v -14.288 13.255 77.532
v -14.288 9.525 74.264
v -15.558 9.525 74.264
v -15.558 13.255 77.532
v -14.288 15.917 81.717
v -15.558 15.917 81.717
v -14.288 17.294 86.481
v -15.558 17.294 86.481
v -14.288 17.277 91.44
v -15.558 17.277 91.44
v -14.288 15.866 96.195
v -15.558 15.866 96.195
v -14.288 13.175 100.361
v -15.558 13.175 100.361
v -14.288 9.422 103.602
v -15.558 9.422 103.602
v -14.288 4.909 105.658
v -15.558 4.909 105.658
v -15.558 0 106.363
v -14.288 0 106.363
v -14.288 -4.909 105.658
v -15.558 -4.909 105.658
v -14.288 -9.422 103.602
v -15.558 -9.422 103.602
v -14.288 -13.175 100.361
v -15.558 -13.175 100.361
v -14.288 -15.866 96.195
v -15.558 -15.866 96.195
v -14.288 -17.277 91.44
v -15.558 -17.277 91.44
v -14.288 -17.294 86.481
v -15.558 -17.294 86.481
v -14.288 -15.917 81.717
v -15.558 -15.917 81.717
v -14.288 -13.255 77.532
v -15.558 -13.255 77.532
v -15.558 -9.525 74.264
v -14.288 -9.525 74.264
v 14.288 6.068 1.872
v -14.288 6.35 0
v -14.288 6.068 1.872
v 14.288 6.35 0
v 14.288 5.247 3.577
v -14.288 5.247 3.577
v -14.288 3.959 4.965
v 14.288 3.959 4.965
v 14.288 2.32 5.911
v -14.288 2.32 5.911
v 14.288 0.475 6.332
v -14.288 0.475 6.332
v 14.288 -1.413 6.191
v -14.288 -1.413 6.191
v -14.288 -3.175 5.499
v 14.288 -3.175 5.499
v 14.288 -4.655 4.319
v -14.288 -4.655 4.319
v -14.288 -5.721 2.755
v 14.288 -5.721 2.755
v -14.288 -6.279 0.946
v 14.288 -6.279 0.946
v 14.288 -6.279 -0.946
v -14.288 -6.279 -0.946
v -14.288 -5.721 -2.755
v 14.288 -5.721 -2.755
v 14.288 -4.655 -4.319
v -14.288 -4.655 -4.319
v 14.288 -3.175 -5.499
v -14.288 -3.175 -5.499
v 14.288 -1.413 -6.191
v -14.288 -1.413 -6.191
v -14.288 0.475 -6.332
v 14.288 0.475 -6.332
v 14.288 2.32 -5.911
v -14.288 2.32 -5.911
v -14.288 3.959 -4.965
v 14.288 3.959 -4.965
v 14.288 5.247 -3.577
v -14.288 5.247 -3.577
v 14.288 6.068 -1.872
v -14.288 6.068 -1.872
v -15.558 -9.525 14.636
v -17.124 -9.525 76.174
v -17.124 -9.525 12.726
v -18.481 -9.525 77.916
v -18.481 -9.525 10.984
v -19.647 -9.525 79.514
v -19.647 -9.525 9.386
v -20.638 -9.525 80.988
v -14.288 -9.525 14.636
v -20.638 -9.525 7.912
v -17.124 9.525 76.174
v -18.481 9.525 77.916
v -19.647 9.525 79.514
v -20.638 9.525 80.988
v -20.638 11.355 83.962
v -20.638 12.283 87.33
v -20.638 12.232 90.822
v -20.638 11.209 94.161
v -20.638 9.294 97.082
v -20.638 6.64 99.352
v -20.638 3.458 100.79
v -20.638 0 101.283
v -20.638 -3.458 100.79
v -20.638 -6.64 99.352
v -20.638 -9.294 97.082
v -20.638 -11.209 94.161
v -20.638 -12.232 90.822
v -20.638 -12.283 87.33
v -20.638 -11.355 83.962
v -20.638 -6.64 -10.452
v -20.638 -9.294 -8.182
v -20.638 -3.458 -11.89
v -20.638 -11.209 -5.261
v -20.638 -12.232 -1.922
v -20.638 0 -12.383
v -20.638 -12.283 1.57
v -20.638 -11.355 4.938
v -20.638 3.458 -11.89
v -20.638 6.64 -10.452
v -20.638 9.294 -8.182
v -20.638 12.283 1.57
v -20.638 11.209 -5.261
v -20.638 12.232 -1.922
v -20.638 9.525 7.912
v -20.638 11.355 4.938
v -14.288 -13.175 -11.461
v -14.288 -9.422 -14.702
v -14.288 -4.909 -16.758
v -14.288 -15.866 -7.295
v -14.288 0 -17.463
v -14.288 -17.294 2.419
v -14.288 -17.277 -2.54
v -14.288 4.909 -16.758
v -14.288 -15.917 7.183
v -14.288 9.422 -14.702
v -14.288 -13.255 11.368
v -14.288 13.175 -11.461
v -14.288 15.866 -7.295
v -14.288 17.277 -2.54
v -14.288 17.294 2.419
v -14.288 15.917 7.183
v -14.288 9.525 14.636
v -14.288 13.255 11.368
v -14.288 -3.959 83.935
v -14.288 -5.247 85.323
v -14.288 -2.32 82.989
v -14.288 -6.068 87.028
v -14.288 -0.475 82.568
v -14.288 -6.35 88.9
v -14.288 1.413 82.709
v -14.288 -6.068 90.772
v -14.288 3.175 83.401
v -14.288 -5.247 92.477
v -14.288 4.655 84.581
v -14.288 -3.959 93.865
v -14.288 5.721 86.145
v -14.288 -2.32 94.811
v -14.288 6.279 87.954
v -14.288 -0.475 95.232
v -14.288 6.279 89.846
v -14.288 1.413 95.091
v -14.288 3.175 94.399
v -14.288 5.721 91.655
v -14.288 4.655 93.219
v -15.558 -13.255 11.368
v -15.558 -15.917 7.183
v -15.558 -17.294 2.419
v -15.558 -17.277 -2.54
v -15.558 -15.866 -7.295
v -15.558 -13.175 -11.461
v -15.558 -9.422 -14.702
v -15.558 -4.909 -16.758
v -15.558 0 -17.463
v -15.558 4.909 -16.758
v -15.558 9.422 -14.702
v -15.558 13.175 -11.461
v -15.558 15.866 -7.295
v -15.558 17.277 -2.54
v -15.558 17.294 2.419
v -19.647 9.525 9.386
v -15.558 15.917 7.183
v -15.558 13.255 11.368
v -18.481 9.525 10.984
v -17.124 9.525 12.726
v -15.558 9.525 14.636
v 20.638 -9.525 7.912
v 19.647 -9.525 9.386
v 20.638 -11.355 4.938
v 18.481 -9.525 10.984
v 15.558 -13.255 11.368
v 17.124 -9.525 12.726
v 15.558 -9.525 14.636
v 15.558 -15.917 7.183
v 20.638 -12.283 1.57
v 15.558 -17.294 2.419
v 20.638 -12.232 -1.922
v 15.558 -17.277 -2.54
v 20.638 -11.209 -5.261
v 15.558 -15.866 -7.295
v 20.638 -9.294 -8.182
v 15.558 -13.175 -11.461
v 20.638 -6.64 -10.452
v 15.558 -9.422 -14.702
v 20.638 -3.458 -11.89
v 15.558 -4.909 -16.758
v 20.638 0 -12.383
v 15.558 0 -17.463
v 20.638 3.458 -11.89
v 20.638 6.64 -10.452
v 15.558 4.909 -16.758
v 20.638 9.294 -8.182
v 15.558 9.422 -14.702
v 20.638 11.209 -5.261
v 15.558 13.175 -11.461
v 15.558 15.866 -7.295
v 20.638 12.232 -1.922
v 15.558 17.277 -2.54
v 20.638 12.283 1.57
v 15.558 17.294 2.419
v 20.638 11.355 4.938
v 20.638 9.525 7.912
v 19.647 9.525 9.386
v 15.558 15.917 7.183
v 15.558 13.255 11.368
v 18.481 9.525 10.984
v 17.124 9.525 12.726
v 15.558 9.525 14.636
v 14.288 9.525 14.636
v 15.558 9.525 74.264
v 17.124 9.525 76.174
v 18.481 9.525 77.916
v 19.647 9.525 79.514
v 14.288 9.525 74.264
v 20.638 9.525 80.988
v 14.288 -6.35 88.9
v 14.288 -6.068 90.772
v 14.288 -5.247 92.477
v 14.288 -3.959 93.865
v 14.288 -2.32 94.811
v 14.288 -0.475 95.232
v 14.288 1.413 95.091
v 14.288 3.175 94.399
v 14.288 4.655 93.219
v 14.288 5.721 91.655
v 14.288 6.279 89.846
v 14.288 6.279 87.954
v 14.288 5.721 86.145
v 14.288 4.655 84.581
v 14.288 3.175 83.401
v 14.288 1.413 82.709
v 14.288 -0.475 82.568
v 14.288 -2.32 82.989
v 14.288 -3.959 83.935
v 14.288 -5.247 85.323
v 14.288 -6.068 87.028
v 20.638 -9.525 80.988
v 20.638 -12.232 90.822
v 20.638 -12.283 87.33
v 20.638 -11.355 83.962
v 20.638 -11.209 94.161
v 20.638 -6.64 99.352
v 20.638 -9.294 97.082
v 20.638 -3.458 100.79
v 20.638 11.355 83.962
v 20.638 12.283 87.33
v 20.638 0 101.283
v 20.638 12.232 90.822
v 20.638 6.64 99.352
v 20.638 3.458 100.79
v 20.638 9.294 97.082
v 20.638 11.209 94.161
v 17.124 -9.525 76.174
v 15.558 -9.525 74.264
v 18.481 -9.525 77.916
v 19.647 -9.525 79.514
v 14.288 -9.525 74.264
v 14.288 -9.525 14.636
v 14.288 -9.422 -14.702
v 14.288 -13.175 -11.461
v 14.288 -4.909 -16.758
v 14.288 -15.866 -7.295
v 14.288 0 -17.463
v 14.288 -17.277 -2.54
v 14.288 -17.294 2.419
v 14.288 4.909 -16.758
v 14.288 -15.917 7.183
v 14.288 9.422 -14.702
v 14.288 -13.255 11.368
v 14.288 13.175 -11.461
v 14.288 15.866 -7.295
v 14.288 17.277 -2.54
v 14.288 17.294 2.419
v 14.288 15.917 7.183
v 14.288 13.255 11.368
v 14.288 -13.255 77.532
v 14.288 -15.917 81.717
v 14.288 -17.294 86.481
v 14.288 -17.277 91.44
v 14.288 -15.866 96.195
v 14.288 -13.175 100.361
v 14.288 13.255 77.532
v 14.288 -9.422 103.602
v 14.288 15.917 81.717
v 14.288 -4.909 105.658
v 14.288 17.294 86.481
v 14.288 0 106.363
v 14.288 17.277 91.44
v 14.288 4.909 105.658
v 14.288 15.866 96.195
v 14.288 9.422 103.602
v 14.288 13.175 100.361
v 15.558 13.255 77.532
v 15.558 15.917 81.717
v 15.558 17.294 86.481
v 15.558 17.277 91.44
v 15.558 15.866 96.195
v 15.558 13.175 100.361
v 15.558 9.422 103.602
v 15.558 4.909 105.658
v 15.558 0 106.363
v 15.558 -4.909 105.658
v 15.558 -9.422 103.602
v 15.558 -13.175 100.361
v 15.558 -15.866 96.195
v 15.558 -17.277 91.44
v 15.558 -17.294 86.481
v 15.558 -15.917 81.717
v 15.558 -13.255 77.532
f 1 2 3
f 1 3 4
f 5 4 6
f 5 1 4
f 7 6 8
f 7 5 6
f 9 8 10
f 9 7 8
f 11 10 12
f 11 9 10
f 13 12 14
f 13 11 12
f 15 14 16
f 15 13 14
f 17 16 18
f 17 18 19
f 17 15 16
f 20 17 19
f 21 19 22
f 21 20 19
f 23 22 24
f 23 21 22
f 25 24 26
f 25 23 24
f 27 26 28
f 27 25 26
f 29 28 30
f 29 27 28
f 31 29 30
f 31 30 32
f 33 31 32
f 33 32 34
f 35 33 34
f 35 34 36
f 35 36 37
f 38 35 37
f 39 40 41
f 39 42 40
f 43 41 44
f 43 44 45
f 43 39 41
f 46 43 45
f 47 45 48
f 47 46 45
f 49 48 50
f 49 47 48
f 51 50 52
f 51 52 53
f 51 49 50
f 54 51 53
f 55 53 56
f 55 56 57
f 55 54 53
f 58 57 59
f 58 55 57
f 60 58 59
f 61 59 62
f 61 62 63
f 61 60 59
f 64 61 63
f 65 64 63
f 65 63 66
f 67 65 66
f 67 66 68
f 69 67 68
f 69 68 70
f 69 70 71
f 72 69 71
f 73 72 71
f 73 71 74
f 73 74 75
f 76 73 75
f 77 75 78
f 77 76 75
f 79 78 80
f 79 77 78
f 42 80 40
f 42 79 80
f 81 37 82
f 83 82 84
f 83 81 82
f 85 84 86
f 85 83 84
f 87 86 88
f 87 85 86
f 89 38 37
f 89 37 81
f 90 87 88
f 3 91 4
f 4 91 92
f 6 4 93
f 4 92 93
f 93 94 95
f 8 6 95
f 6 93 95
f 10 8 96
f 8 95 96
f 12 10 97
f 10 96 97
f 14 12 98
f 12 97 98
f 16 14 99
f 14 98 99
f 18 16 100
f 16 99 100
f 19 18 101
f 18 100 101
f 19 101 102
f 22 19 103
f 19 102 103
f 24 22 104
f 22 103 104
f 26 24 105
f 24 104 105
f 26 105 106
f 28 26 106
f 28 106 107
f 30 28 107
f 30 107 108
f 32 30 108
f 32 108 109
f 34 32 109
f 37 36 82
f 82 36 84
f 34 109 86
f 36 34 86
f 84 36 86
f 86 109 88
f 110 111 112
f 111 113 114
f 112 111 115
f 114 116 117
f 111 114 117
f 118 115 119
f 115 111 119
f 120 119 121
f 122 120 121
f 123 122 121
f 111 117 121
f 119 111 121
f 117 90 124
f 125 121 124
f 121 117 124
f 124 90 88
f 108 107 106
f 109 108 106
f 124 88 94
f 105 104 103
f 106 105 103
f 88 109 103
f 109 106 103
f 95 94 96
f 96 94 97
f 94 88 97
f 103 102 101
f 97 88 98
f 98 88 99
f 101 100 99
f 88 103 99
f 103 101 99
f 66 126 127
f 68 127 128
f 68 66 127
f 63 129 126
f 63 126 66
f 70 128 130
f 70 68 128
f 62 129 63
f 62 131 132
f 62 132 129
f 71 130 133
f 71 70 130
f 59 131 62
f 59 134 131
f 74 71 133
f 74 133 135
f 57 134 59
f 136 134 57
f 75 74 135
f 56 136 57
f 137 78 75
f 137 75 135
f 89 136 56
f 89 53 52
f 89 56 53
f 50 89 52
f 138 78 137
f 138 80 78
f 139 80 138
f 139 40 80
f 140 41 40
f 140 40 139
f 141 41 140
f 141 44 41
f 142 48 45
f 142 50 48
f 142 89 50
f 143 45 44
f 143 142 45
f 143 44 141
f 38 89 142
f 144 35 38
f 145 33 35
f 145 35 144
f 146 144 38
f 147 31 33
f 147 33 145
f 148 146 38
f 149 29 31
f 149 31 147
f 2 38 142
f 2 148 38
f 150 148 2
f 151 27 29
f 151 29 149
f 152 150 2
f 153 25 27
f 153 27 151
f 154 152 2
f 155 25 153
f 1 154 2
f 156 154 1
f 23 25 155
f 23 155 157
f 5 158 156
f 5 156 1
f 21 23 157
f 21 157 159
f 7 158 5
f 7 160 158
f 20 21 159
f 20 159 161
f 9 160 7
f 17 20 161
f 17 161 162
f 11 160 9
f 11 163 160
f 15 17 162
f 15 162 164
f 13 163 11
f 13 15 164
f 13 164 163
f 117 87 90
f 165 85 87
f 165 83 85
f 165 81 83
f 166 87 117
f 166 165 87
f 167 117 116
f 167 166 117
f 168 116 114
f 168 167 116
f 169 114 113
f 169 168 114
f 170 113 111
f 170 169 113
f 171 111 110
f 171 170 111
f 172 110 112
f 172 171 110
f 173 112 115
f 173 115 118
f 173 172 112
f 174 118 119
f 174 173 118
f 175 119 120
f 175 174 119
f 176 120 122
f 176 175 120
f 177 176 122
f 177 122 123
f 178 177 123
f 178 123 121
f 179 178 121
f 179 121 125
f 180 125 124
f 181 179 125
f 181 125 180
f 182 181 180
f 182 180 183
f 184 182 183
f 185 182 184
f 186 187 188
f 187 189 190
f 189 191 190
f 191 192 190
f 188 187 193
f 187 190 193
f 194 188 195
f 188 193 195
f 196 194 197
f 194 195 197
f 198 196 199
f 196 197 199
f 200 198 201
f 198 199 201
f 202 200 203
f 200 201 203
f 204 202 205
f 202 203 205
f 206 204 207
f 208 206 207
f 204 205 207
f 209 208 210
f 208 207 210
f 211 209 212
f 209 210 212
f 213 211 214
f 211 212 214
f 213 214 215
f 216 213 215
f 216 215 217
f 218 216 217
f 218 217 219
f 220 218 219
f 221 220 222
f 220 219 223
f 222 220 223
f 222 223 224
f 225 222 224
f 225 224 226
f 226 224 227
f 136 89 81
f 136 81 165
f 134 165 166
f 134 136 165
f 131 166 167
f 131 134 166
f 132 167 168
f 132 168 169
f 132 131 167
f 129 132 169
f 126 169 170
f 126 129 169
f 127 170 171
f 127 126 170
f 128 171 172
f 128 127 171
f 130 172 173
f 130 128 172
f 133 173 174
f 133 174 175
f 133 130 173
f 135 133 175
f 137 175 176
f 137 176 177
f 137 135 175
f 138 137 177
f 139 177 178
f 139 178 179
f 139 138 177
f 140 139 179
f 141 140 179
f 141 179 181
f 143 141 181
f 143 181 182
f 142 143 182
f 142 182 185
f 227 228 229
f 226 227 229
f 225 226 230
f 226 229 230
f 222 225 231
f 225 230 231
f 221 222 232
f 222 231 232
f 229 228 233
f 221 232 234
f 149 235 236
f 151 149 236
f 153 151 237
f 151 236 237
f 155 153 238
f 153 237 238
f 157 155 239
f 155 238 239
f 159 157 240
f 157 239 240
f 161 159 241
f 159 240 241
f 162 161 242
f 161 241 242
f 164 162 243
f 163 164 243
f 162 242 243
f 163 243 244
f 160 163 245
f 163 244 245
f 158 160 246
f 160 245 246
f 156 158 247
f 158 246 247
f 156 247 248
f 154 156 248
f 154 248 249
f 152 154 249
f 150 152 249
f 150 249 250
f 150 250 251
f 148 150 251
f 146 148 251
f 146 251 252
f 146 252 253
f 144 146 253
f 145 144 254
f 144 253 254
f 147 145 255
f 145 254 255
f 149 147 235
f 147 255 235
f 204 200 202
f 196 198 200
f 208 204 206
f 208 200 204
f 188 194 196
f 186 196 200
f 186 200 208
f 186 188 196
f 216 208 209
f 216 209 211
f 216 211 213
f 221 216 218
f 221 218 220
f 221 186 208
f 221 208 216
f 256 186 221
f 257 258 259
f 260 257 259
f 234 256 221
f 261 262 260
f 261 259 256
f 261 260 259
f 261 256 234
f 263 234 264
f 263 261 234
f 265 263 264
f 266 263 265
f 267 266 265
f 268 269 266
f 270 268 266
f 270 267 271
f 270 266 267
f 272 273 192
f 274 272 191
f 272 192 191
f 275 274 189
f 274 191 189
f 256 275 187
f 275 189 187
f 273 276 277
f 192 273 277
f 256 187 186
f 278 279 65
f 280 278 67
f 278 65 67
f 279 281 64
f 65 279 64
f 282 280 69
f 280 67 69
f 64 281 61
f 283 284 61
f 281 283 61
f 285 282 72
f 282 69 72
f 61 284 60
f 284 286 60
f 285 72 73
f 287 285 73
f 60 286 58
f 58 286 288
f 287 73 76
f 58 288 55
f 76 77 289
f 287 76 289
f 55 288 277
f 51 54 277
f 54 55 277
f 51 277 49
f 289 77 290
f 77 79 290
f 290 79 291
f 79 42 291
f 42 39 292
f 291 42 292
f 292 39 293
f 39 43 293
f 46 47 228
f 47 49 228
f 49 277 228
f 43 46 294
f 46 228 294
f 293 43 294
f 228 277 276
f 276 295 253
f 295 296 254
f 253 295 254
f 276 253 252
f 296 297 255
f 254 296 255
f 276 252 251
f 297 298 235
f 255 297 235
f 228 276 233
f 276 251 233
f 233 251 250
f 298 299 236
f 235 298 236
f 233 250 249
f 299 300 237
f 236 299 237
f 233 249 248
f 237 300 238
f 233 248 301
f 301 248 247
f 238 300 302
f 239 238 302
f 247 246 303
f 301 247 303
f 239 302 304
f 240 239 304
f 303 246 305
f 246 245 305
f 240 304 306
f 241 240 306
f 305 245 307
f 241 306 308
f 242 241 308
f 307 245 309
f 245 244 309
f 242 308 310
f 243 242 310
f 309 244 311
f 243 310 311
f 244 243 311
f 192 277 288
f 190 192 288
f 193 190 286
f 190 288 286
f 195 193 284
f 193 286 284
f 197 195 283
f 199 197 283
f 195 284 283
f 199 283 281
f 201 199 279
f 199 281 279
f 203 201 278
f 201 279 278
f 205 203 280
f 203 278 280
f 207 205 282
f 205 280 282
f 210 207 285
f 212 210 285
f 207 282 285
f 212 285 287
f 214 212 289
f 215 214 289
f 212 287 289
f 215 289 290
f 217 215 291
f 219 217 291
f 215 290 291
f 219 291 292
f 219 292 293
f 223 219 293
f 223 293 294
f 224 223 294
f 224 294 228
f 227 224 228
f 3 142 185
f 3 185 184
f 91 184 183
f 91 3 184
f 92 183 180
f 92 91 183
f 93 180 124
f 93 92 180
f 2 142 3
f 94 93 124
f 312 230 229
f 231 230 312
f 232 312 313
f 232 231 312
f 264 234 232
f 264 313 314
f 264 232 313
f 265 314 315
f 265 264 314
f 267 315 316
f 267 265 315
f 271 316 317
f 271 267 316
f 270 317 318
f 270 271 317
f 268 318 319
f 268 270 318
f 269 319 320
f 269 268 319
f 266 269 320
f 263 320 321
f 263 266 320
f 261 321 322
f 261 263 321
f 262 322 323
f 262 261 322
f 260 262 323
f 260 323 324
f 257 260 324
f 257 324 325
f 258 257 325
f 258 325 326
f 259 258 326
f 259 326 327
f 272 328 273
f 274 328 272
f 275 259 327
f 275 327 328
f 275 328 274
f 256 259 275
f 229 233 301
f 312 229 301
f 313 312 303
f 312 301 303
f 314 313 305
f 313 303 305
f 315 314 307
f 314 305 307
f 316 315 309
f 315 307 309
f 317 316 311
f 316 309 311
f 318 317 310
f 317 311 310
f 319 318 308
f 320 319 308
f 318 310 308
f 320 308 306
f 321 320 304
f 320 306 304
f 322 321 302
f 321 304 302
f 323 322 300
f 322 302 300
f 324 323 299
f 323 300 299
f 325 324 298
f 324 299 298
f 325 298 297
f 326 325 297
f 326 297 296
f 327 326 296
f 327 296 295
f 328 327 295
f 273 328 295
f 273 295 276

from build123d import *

# Parameters (mm, degrees)
F0_R     = 6.35
F1_DEPTH = 14.2875
F3_DEPTH = 6.35
F4_SIZE  = 5.08
F5_R     = 6.35
F6_DEPTH = 28.575


with BuildPart() as f1:
    # F0 (on Right) → F1 (new body, symmetric)
    with BuildSketch(Plane.YZ):
        Circle(F0_R)
    extrude(amount=F1_DEPTH, both=True)

    # F2 (on face) → F3 (join)
    with BuildSketch(Plane.YZ.offset(14.2875)):
        with BuildLine():
            Line((9.525, 88.9), (9.525, 74.263973174))
            ThreePointArc((9.525, 74.263973174), (15.3503944371, 80.5750797676), (17.4625, 88.9))
            ThreePointArc((17.4625, 88.9), (-8.3249202324, 104.2503944371), (-9.525, 74.263973174))
            Line((-9.525, 74.263973174), (-9.525, 88.9))
            Line((-9.525, 88.9), (9.525, 88.9))
        make_face()
        with BuildLine():
            ThreePointArc((-9.525, 74.263973174), (0, 71.4375), (9.525, 74.263973174))
            Line((9.525, 74.263973174), (9.525, 88.9))
            Line((9.525, 88.9), (-9.525, 88.9))
            Line((-9.525, 88.9), (-9.525, 74.263973174))
        make_face()
        with BuildLine():
            ThreePointArc((-9.525, 14.636026826), (0, 17.4625), (9.525, 14.636026826))
            Line((9.525, 14.636026826), (9.525, 74.263973174))
            ThreePointArc((9.525, 74.263973174), (0, 71.4375), (-9.525, 74.263973174))
            Line((-9.525, 74.263973174), (-9.525, 14.636026826))
        make_face()
        with BuildLine():
            Line((9.525, 0), (9.525, 14.636026826))
            ThreePointArc((9.525, 14.636026826), (0, 17.4625), (-9.525, 14.636026826))
            Line((-9.525, 14.636026826), (-9.525, 0))
            Line((-9.525, 0), (-6.35, 0))
            ThreePointArc((-6.35, 0), (0, 6.35), (6.35, 0))
            Line((6.35, 0), (9.525, 0))
        make_face()
        with BuildLine():
            ThreePointArc((-6.35, 0), (0, -6.35), (6.35, 0))
            Line((6.35, 0), (-6.35, 0))
        make_face()
        with BuildLine():
            ThreePointArc((-9.525, 14.636026826), (-8.3249202324, -15.3503944371), (17.4625, 0))
            ThreePointArc((17.4625, 0), (15.3503944371, 8.3249202324), (9.525, 14.636026826))
            Line((9.525, 14.636026826), (9.525, 0))
            Line((9.525, 0), (6.35, 0))
            ThreePointArc((6.35, 0), (0, -6.35), (-6.35, 0))
            Line((-6.35, 0), (-9.525, 0))
            Line((-9.525, 0), (-9.525, 14.636026826))
        make_face()
        with BuildLine():
            Line((-6.35, 0), (6.35, 0))
            ThreePointArc((6.35, 0), (0, 6.35), (-6.35, 0))
        make_face()
    extrude(amount=F3_DEPTH)

    # F4
    f4_edges = [f1.edges().sort_by_distance(p)[0] for p in [
        (20.6375, 0, 106.3625),
        (20.6375, 0, -17.4625),
    ]]
    chamfer(f4_edges, length=F4_SIZE)

    # F5 (on face) → F6 (join)
    with BuildSketch(Plane(origin=(14.2875, 0, 0), x_dir=(0, -1, 0), z_dir=(-1, 0, 0))):
        with Locations((0, 88.9)):
            Circle(F5_R)
    extrude(amount=F6_DEPTH)

    # F7: F1 across plane


with BuildPart() as f1_1:
    add(f1.part)
    add(f1.part.mirror(Plane.YZ))


solid = f1_1.part
